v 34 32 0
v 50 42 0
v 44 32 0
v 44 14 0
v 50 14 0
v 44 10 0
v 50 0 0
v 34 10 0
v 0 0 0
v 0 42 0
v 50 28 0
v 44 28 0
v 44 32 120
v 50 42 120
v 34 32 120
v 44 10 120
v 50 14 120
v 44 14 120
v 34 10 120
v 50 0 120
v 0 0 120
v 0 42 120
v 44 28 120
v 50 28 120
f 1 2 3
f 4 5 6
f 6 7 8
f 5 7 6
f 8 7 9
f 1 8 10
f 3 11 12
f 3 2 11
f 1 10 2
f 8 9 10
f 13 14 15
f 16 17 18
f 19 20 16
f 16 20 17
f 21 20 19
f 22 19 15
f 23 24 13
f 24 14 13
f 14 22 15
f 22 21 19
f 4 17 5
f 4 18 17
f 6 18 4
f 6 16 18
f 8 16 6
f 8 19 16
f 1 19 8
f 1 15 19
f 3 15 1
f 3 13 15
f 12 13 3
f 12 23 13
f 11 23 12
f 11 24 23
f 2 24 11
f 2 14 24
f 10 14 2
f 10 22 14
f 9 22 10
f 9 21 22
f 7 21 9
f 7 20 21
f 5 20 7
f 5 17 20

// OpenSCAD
$fn = 32;

// ----------------------------------------------------------------------
// T-slot rail: 50 x 42 mm section, 120 mm long
// ----------------------------------------------------------------------

// --- parameters (mm) ---
profile_height = 120;     // extrusion height
profile_points = 12;      // points of the closed outline

profile = [[0, 0], [50, 0], [50, 14], [44, 14], [44, 10], [34, 10], [34, 32], [44, 32], [44, 28], [50, 28], [50, 42], [0, 42]];  // single closed polygon, 12 points, counter clockwise

// --- the one profile operation ---
linear_extrude(height = profile_height) polygon(points = profile);
